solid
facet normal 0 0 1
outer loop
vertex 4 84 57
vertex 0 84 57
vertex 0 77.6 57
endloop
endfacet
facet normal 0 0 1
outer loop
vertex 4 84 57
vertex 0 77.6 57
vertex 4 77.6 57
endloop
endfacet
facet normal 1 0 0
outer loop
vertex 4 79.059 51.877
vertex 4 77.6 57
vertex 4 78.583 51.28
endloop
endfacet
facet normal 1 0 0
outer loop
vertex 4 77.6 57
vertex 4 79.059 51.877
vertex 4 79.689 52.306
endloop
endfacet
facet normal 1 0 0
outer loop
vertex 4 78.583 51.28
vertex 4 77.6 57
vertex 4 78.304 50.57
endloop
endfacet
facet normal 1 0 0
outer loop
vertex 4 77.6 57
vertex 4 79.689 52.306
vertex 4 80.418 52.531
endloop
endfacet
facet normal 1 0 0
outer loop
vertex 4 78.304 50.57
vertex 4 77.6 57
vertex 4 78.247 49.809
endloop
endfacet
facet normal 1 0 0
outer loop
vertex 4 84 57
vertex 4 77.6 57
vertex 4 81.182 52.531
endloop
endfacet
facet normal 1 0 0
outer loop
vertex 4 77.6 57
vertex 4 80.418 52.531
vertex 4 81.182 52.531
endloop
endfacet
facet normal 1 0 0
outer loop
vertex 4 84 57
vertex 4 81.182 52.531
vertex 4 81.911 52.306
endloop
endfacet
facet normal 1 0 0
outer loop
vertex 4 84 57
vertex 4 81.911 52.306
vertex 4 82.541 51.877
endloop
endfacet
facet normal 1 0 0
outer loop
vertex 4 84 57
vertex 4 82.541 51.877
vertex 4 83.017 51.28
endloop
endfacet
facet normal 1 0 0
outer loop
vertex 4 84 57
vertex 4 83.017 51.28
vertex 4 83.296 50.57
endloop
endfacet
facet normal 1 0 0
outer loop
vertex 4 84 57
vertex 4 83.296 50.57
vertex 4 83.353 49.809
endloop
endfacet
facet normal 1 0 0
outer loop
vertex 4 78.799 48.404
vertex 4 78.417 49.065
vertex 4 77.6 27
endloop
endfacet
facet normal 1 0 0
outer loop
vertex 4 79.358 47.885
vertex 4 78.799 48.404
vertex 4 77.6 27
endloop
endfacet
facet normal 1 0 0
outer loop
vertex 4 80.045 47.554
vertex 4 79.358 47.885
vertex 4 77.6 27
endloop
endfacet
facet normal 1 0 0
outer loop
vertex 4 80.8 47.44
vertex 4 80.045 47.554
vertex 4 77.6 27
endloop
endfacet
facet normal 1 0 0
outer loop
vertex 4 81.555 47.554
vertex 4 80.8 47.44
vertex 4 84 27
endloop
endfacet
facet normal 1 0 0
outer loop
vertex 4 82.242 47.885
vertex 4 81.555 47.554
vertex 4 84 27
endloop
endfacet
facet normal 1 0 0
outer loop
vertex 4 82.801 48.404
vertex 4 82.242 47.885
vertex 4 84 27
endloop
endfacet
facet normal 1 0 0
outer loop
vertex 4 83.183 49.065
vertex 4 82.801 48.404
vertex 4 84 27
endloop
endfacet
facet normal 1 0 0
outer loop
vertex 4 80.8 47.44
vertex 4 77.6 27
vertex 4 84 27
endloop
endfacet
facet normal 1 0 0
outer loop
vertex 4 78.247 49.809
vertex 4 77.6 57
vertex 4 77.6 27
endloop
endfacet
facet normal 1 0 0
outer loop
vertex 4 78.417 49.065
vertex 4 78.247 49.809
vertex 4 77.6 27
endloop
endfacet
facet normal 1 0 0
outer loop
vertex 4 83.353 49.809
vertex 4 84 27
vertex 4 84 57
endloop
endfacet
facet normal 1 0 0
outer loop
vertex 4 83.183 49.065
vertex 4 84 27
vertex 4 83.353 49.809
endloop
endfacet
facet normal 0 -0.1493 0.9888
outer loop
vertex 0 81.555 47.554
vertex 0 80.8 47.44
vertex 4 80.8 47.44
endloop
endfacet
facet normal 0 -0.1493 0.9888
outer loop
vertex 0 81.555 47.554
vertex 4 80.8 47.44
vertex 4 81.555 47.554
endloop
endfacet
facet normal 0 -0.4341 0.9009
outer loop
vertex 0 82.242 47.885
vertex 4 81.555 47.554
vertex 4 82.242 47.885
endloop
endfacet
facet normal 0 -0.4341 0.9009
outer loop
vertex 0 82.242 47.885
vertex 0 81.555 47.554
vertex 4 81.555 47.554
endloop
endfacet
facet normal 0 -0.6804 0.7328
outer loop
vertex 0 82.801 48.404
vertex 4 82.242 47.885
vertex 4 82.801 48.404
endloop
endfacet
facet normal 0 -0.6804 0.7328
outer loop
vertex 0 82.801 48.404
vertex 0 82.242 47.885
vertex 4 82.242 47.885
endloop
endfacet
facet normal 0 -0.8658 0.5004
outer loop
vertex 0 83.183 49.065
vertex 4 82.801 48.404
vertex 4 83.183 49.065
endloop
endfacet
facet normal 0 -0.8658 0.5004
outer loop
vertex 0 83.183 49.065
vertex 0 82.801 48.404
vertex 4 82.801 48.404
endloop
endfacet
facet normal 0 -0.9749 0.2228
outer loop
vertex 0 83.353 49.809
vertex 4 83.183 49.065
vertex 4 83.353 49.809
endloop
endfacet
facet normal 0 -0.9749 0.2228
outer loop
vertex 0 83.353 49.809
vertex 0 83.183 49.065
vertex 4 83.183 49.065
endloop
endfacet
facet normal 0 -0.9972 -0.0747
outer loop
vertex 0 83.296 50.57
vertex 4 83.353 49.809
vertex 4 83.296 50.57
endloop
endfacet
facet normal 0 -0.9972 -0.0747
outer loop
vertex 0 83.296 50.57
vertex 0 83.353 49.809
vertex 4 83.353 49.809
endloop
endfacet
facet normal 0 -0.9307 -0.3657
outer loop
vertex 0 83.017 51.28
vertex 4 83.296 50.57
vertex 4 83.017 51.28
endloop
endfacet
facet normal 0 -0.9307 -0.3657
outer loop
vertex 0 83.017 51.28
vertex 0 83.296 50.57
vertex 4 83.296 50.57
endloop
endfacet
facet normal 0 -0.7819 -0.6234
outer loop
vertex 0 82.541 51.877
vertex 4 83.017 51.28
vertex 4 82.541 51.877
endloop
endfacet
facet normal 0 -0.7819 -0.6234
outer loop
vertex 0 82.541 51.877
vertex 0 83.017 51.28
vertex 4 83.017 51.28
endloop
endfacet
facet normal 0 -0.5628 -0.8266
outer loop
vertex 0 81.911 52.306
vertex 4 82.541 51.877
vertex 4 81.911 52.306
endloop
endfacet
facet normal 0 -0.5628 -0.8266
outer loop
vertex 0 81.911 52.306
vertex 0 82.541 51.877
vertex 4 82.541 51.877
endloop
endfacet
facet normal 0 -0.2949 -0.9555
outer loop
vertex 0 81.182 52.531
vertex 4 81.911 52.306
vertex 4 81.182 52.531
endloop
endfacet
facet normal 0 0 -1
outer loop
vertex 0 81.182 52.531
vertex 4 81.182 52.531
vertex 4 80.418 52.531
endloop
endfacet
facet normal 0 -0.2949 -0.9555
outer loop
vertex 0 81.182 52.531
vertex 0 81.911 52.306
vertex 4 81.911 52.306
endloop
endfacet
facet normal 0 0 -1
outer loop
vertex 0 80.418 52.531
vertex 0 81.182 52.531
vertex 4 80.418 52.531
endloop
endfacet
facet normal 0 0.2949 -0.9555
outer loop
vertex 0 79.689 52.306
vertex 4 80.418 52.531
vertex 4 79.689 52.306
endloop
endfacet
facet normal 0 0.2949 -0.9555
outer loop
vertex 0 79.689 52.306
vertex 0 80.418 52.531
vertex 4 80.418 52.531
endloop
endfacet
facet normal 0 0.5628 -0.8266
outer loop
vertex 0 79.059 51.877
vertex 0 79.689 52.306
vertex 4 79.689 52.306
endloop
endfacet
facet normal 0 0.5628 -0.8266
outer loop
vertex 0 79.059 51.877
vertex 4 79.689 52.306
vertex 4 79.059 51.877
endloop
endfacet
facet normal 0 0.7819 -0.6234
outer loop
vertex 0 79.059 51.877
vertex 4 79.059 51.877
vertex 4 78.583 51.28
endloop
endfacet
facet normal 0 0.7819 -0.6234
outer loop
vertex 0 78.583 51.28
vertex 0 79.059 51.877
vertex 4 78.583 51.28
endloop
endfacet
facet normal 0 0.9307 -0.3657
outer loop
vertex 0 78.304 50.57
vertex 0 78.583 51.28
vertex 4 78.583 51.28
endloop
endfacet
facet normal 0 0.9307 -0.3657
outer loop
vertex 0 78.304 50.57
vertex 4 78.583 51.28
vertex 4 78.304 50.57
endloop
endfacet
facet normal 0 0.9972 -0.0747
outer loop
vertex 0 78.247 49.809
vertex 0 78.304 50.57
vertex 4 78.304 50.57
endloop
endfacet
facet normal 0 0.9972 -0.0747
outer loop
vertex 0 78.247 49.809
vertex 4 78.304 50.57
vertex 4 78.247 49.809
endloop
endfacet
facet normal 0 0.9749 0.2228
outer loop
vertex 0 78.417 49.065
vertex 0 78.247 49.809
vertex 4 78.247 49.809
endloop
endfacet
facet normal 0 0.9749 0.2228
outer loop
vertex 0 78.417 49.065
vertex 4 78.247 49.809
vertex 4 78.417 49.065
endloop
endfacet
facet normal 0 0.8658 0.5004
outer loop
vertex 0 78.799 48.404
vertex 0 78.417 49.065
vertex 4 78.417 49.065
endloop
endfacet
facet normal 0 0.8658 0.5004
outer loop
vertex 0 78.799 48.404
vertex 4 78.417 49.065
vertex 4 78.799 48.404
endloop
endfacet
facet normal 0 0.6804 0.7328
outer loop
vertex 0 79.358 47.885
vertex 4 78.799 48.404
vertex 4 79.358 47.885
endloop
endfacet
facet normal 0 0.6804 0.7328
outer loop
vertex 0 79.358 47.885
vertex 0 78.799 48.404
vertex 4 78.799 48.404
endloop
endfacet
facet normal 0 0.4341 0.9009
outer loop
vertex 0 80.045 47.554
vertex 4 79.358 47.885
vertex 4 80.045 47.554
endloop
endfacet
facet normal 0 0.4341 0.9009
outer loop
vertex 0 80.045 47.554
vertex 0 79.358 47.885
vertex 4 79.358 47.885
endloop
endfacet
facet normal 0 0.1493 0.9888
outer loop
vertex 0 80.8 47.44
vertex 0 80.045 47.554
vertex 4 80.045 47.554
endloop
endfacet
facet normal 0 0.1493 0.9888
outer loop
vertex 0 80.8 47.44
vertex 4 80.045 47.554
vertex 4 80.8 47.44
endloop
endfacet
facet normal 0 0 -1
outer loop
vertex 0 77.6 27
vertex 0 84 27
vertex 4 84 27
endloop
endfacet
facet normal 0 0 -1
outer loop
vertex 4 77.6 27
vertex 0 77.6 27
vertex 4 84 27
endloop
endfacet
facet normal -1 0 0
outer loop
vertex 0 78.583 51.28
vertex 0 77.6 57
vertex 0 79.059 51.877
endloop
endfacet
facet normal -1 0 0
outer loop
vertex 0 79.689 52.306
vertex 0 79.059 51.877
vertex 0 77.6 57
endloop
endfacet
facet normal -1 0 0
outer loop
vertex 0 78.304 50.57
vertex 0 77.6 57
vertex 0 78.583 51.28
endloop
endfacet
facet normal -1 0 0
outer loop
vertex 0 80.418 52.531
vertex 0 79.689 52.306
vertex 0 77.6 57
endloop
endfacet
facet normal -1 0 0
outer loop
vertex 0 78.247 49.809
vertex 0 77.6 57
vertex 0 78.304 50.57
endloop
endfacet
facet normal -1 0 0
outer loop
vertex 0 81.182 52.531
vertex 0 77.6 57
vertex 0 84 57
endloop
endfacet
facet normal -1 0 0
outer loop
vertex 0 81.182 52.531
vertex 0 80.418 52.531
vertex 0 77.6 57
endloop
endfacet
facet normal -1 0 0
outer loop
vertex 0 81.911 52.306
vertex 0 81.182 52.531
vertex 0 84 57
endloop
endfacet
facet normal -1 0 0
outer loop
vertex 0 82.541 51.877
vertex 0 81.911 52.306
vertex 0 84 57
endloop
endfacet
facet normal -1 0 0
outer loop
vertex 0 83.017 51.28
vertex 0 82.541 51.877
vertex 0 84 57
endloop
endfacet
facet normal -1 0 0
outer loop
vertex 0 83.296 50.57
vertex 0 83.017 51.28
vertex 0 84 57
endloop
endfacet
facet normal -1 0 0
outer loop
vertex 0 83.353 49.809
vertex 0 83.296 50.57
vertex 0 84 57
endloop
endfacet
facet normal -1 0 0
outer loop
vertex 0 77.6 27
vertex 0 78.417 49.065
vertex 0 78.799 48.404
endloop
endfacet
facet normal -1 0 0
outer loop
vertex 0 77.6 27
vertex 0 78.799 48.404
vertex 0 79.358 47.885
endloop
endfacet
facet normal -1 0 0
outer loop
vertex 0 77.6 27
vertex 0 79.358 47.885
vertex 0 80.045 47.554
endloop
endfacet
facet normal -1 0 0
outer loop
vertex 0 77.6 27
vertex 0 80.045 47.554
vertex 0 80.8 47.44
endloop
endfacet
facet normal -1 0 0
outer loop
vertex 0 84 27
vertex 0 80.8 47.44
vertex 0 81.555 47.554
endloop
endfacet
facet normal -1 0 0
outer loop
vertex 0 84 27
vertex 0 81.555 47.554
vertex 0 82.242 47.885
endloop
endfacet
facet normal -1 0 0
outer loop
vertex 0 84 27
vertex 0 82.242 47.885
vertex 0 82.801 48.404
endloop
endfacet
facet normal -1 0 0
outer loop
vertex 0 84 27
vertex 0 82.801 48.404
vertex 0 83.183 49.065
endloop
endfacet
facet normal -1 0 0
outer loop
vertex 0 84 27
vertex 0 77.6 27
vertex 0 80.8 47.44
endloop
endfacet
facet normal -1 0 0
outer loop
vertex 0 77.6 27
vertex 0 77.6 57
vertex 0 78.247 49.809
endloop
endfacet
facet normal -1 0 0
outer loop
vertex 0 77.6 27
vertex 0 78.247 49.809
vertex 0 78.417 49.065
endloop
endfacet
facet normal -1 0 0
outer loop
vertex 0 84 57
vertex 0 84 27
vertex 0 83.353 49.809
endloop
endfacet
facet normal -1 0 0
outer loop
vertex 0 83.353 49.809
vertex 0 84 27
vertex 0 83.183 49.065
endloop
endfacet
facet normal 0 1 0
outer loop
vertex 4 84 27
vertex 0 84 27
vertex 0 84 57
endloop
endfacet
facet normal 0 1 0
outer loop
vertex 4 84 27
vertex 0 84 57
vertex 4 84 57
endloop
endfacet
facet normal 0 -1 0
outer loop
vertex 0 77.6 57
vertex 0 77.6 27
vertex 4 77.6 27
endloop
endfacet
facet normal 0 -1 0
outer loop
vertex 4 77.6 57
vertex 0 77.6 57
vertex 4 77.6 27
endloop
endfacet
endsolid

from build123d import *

# Parameters (mm, degrees)
BASE_MOUNTED_START            = 27
SKETCH1_W                     = 4
SKETCH1_H                     = 6.4
BASE_MOUNTED_STOP_BLOCK_DEPTH = 30
SKETCH2_R                     = 2.56
M6_TAP_CORE_DEPTH             = 4


with BuildPart() as part:
    # Sketch1 → Base-mounted stop block (new body)
    with BuildSketch(Plane.XY.offset(BASE_MOUNTED_START)):
        with Locations((2, 80.8)):
            Rectangle(SKETCH1_W, SKETCH1_H)
    extrude(amount=BASE_MOUNTED_STOP_BLOCK_DEPTH)

    # Sketch2 → M6 tap core (cut)
    with BuildSketch(Plane(origin=(0, 0, 0), x_dir=(0, 0, -1), z_dir=(1, 0, 0))):
        with Locations((-50, 80.8)):
            Circle(SKETCH2_R)
    extrude(amount=M6_TAP_CORE_DEPTH, mode=Mode.SUBTRACT)


solid = part.part
